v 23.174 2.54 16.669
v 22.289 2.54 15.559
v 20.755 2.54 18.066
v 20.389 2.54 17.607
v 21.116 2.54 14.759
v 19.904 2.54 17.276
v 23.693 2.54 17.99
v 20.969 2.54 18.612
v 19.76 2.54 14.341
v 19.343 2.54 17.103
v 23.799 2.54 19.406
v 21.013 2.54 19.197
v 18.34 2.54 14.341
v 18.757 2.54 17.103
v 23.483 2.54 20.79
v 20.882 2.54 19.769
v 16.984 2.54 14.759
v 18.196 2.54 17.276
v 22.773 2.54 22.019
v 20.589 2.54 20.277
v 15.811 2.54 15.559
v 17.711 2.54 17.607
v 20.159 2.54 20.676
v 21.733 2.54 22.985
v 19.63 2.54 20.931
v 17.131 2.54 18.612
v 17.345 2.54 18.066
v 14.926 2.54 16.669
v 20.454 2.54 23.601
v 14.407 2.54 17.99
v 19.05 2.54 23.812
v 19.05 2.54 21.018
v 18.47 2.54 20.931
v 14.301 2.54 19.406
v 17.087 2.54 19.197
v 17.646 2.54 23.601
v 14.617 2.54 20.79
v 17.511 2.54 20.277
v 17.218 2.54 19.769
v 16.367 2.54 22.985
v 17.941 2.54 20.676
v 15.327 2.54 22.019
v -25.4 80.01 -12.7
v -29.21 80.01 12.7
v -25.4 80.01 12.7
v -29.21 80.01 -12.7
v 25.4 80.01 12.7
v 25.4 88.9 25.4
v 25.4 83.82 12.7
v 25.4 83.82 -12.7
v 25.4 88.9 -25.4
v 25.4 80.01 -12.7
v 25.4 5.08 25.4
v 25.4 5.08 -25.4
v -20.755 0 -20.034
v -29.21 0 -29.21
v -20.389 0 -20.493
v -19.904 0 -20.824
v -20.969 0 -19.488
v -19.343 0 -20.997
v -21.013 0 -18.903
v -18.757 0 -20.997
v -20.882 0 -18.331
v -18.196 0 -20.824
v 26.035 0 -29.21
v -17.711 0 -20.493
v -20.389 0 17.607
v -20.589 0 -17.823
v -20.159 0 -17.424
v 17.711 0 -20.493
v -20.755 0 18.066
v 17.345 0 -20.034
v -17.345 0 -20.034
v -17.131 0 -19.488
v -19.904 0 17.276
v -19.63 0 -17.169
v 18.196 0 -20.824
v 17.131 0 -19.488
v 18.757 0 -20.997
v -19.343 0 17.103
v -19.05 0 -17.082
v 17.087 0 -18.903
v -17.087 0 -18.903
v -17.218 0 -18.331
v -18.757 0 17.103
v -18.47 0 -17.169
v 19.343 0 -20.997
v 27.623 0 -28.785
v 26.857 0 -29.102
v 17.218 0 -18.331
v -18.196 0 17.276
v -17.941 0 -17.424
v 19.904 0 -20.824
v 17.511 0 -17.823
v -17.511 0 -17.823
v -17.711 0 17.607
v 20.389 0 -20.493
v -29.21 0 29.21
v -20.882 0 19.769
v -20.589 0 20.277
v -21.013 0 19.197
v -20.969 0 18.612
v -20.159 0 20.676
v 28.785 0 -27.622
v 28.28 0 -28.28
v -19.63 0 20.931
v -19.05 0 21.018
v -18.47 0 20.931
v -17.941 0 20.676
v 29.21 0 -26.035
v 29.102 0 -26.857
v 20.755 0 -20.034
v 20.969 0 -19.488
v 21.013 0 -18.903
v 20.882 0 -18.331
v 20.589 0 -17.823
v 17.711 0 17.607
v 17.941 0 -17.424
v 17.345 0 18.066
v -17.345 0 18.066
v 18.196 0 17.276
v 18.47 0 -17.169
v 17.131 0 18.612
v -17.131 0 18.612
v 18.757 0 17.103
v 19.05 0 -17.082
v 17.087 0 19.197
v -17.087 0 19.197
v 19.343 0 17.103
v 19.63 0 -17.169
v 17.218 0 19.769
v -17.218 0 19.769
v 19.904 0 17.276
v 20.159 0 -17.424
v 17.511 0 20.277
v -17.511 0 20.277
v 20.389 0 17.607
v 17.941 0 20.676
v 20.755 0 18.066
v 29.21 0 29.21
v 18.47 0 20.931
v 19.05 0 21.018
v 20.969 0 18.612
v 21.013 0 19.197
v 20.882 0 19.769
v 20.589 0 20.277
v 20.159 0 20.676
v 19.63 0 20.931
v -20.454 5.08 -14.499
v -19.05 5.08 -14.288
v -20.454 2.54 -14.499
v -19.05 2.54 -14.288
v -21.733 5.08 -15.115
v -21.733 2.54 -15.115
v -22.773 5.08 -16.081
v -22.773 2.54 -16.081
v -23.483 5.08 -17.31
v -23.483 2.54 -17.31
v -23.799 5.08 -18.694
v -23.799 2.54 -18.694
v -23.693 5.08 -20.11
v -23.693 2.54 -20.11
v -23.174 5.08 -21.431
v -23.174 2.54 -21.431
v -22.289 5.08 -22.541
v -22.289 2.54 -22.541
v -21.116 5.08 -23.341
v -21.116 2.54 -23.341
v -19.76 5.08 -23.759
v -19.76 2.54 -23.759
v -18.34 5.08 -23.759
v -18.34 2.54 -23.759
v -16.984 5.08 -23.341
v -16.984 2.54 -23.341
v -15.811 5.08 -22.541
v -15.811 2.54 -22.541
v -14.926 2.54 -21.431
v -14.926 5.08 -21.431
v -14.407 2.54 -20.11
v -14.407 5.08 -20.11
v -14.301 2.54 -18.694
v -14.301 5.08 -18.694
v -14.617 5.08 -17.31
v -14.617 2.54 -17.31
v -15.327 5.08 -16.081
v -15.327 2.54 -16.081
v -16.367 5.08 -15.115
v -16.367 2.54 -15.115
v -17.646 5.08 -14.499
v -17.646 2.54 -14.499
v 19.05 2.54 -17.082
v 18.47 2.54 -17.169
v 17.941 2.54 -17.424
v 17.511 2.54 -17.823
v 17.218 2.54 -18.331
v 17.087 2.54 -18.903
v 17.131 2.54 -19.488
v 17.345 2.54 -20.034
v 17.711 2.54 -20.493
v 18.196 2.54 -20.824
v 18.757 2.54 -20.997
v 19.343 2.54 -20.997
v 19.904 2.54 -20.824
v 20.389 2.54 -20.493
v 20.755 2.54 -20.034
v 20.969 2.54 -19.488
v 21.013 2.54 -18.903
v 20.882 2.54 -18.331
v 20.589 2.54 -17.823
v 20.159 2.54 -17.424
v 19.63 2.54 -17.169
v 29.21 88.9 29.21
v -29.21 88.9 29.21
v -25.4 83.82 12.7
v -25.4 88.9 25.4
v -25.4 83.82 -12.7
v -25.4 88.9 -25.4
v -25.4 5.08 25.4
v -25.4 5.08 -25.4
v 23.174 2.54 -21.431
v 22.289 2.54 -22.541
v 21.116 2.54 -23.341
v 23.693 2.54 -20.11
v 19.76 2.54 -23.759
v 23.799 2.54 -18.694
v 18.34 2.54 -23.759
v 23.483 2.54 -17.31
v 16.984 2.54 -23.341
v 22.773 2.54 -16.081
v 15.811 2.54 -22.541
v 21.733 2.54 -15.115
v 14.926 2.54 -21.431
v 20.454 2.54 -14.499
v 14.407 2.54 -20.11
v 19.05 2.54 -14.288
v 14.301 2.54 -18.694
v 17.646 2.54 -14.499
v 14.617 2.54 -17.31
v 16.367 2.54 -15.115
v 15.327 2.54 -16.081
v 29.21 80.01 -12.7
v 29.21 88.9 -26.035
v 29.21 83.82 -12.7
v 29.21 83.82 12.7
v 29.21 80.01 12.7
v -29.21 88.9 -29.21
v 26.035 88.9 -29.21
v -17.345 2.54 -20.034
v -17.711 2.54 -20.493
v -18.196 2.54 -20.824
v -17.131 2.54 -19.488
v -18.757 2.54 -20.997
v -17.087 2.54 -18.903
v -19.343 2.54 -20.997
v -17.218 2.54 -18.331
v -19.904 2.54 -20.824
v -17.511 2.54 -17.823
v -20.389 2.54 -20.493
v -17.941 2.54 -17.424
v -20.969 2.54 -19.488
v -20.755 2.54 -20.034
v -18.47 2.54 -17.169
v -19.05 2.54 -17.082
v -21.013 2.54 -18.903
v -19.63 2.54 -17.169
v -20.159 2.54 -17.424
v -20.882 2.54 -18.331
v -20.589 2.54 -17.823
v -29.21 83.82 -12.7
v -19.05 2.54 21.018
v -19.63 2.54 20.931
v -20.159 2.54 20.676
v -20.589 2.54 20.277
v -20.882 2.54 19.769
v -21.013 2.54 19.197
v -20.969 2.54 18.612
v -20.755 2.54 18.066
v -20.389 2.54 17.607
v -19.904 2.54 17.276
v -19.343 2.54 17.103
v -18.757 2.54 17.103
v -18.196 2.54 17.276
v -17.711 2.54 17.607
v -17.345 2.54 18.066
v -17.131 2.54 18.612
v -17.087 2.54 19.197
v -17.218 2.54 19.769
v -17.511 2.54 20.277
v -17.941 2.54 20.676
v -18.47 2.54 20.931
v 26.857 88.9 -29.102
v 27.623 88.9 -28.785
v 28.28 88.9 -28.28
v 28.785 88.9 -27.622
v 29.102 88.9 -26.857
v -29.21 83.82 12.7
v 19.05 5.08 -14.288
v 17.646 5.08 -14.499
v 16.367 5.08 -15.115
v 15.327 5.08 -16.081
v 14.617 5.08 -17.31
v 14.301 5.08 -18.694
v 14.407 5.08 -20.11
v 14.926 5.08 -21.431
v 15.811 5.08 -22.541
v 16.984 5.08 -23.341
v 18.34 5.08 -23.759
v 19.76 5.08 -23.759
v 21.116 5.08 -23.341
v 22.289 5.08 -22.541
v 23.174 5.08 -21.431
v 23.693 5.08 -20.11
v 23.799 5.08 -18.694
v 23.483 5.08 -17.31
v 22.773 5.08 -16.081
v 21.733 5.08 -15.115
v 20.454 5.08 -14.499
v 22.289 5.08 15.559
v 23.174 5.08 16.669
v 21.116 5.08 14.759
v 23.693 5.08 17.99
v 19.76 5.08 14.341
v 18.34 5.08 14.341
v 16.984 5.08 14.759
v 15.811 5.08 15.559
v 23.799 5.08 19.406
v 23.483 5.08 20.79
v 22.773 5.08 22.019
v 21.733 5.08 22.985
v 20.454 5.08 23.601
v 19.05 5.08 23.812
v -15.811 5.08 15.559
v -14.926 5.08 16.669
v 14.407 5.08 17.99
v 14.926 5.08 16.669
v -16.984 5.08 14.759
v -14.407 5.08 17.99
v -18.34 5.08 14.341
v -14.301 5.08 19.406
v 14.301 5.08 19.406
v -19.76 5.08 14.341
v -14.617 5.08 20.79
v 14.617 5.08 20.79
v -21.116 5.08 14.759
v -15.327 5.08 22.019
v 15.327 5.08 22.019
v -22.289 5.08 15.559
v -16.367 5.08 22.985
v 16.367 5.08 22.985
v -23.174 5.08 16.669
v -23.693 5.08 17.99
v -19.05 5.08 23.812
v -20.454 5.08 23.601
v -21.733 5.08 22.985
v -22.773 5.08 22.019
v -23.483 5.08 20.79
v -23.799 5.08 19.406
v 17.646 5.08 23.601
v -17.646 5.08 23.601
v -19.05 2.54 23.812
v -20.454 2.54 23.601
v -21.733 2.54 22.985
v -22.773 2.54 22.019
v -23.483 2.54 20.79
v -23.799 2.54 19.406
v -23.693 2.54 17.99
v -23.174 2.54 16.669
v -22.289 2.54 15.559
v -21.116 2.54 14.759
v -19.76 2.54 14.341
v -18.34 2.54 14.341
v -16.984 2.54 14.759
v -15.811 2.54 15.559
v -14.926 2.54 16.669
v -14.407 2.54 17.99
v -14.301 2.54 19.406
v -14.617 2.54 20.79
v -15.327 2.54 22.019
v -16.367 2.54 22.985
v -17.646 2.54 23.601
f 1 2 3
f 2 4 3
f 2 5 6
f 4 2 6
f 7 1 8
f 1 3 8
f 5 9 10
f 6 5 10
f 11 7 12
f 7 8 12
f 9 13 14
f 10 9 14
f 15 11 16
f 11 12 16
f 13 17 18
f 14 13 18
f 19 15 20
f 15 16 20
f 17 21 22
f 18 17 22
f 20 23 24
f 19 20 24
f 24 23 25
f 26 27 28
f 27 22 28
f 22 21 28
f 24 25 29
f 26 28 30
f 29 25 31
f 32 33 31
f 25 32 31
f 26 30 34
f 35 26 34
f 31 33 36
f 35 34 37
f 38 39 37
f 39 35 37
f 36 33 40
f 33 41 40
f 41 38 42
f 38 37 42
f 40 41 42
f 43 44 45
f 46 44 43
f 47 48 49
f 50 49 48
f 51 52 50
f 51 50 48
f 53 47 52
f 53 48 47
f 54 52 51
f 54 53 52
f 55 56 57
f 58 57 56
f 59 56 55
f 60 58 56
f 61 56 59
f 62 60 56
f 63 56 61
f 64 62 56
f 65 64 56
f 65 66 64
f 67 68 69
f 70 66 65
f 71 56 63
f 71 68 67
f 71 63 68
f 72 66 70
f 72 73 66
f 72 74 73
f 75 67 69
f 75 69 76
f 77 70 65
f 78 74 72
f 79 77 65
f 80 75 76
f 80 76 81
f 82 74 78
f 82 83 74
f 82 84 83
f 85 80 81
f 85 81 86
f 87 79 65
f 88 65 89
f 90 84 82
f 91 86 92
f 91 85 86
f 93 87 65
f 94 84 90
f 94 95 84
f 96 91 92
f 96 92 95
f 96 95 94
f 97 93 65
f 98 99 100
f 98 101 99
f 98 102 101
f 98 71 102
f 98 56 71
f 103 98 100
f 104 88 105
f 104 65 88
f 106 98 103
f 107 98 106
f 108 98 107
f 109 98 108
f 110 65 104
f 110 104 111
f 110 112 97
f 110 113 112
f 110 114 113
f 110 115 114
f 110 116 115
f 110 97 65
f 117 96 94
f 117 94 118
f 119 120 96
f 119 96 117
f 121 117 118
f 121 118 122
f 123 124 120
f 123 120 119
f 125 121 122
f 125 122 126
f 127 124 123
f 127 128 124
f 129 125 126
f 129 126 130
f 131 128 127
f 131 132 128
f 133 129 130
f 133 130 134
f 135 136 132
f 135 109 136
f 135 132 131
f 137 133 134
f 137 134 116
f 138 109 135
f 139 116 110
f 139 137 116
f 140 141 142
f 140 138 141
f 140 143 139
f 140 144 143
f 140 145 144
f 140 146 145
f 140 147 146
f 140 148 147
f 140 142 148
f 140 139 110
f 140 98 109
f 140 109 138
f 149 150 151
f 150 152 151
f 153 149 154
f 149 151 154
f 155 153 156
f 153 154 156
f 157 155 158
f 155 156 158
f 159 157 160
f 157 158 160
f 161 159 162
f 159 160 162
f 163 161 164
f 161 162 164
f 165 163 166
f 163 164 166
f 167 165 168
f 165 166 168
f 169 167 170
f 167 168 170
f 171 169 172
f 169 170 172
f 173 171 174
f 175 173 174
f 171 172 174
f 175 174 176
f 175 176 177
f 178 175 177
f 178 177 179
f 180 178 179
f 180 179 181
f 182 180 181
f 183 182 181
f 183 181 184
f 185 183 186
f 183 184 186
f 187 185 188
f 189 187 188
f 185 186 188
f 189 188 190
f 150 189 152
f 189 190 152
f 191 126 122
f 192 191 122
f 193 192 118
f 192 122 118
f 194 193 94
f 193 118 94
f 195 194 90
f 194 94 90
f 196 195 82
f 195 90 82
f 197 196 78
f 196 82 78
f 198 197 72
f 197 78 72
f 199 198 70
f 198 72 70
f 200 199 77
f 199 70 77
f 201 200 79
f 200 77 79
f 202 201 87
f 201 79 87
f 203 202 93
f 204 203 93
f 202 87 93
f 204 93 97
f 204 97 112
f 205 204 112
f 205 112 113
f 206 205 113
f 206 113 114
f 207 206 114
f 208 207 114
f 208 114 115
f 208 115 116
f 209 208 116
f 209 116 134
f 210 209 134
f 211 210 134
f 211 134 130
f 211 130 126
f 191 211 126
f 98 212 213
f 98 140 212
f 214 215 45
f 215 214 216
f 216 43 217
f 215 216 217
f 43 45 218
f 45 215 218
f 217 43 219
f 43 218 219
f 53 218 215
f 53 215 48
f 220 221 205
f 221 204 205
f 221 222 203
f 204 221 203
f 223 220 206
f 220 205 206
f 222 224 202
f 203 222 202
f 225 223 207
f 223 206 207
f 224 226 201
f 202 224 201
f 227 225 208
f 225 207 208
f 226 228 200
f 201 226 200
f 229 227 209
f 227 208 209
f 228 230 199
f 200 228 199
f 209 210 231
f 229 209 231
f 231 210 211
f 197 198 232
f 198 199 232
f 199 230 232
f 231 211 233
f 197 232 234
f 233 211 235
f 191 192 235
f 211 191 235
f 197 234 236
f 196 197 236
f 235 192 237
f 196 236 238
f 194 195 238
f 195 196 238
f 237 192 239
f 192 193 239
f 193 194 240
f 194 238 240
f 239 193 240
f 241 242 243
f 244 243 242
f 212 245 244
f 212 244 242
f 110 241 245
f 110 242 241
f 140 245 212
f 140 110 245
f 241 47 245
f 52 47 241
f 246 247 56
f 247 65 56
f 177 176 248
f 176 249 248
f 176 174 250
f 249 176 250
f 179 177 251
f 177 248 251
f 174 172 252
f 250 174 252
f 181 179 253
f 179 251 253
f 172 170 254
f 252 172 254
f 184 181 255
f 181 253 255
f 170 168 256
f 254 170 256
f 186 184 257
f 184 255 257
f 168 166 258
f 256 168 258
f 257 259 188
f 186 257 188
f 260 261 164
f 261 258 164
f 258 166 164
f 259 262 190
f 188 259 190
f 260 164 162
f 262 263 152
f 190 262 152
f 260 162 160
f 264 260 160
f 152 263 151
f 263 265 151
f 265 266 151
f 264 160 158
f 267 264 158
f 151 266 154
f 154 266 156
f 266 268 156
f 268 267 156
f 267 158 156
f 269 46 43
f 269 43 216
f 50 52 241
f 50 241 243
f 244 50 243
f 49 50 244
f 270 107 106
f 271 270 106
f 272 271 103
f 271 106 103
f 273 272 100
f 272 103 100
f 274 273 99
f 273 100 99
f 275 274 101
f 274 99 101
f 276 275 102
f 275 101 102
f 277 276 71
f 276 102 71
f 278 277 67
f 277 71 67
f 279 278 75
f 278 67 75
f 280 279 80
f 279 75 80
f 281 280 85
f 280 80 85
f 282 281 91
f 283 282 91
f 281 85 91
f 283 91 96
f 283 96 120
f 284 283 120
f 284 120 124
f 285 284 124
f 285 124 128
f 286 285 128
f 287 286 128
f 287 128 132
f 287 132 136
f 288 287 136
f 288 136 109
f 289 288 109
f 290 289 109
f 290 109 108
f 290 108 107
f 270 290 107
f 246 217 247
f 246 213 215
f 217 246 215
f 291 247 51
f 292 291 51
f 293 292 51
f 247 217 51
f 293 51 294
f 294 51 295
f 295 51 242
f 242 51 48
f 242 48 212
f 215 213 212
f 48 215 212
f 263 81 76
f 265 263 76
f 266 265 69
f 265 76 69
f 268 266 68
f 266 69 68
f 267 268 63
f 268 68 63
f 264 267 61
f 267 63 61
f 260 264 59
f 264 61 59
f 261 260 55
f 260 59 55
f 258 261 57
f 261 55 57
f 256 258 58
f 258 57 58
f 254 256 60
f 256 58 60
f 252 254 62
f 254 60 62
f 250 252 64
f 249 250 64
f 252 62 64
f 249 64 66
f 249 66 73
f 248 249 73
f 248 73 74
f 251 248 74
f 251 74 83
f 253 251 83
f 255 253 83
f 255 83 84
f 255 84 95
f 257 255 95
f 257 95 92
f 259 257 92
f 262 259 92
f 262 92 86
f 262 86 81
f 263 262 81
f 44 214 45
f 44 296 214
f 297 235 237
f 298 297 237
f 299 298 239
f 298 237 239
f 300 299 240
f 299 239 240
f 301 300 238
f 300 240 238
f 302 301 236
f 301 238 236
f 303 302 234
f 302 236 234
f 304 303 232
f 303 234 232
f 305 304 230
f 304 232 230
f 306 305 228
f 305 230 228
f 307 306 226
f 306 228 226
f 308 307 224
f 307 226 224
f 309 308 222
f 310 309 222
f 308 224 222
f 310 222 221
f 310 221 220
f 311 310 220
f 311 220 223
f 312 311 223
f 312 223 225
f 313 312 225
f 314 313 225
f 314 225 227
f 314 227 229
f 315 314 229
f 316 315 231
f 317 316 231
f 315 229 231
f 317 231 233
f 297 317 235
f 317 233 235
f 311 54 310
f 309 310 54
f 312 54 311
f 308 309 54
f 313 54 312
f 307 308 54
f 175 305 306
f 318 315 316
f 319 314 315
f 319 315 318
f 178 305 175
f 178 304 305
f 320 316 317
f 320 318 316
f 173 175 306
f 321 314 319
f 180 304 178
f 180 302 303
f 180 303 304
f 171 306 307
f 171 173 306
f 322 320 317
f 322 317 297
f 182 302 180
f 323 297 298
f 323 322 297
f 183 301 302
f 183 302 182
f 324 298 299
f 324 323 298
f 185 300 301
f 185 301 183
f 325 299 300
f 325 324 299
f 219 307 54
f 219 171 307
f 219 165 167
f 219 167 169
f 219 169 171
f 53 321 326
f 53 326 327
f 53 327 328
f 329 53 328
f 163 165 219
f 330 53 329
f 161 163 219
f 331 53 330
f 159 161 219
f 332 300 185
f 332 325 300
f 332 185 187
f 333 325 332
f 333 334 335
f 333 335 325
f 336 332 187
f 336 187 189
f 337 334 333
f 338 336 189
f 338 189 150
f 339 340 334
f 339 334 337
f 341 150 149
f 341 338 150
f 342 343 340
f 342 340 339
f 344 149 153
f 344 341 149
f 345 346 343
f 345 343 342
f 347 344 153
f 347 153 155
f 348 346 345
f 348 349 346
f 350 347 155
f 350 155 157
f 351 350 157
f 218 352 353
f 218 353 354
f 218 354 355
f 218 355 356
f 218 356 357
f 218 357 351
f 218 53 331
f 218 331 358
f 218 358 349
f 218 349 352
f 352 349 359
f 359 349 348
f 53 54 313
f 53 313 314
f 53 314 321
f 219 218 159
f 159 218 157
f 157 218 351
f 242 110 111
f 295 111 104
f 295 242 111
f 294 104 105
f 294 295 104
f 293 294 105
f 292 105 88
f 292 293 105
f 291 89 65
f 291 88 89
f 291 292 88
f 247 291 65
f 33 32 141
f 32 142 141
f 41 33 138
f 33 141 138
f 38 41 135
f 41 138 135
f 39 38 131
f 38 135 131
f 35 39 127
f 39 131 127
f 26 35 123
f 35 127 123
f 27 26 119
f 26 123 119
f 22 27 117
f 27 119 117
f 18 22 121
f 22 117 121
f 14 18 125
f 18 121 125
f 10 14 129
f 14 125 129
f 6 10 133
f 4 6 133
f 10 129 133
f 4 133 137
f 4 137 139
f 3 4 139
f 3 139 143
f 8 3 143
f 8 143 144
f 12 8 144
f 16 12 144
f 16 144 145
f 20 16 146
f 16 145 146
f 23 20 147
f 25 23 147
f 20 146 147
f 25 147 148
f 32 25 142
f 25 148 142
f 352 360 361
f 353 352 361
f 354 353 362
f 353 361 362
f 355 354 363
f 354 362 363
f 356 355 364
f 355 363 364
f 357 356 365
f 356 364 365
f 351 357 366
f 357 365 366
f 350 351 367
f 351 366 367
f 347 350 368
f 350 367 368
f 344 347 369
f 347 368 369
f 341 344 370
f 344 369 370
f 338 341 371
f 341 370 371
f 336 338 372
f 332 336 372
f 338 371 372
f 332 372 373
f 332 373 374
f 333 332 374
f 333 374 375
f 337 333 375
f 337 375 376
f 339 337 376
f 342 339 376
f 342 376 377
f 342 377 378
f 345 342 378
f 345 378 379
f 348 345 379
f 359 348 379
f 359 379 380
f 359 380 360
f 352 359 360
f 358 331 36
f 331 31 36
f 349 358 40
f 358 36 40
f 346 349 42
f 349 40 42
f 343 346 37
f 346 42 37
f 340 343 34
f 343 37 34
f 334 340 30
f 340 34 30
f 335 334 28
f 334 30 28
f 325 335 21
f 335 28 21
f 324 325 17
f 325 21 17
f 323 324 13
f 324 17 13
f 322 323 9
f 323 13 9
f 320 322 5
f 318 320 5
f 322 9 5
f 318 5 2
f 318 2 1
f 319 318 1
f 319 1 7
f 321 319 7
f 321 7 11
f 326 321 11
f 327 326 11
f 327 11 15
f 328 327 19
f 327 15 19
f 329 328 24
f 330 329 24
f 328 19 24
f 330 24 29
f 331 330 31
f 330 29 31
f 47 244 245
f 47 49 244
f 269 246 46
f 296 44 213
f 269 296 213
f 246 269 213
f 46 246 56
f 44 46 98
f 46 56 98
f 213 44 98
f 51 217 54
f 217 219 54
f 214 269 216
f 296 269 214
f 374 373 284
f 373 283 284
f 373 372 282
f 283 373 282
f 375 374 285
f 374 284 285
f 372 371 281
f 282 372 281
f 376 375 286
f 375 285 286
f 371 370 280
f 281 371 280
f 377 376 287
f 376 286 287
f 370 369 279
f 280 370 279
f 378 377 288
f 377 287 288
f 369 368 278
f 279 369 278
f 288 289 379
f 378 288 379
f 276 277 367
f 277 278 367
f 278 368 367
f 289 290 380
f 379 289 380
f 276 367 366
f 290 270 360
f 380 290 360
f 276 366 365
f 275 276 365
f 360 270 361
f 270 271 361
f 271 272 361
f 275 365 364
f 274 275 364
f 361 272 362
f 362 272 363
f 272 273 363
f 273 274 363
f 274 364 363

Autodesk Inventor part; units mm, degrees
ref_plane "YZ Plane" through (0, 0, 0) normal (1, 0, 0) x (0, 1, 0)
ref_plane "XZ Plane" through (0, 0, 0) normal (0, 1, 0) x (-1, 0, 0)
ref_plane "XY Plane" through (0, 0, 0) normal (0, 0, 1) x (1, 0, 0)
sketch "Sketch1" plane through (0, 0, 0) normal (0, 1, 0) x (-1, 0, 0)
  line L0 (25.4, 25.4) -> (-25.4, 25.4)
  line L1 (-25.4, 25.4) -> (-25.4, -25.4)
  line L2 (-25.4, -25.4) -> (25.4, -25.4)
  line L3 (25.4, -25.4) -> (25.4, 25.4)
  line L4 (25.4, 25.4) -> (-25.4, -25.4) construction
  line L5 (-25.4, 25.4) -> (25.4, -25.4) construction
  point P0 (0, 0)
  dimension "d0" = 50.8
  dimension "d1" = 50.8
extrude "Extrusion1" add sketch "Sketch1" along normal blind 5.08
sketch "Sketch2" plane through (0, 5.08, 0) normal (0, 1, 0) x (1, 0, 0)
  line L0 (-25.4, -25.4) -> (25.4, -25.4) projected
  line L1 (-25.4, 25.4) -> (-25.4, -25.4) projected
  line L2 (25.4, -25.4) -> (25.4, 25.4) projected
  line L3 (25.4, 25.4) -> (-25.4, 25.4) projected
  point P0 (0, 0)
  point P1 (-19.05, -19.05)
  point P2 (-19.05, 19.05)
  point P3 (19.05, 19.05)
  point P4 (19.05, -19.05)
  dimension "d4" = 6.35
  dimension "d5" = 6.35
  dimension "d6" = 6.35
  dimension "d7" = 6.35
  dimension "d8" = 6.35
  dimension "d9" = 6.35
  dimension "d10" = 6.35
  dimension "d11" = 6.35
hole "Hole1" at (-19.05, 5.08, 19.05) at (19.05, 5.08, 19.05) at (19.05, 5.08, -19.05) at (-19.05, 5.08, -19.05) direction (0, -1, 0) diameter 3.937 end through all counterbore diameter 9.525 counterbore depth 2.54
sketch "Sketch3" plane through (0, 0, 0) normal (0, -1, 0) x (1, 0, 0)
  line L0 (-29.21, -25.4) -> (-29.21, 25.4)
  line L1 (-25.4, 25.4) -> (-25.4, -25.4)
  line L2 (-25.4, -25.4) -> (25.4, -25.4)
  line L3 (29.21, -25.4) -> (29.21, -29.21)
  line L4 (29.21, -29.21) -> (-29.21, -29.21)
  line L5 (-29.21, -29.21) -> (-29.21, -25.4)
  line L6 (25.4, -25.4) -> (-25.4, -25.4) projected
  line L7 (29.21, -25.4) -> (29.21, 25.4)
  line L8 (25.4, 25.4) -> (25.4, -25.4)
  line L9 (-25.4, 25.4) -> (25.4, 25.4)
  line L10 (29.21, 25.4) -> (29.21, 29.21)
  line L11 (29.21, 29.21) -> (-29.21, 29.21)
  line L12 (-29.21, 29.21) -> (-29.21, 25.4)
  point P0 (0, 0)
  dimension "d20" = 58.42
  dimension "d21" = 3.81
  dimension "d23" = 58.42
  dimension "d24" = 3.81
extrude "Extrusion2" add sketch "Sketch3" against normal blind 88.9
fillet "Fillet1" radius 3.175 1 edges at (29.21, 44.45, -29.21)
sketch "Sketch4" plane through (-29.21, 0, -26.035) normal (-1, 0, 0) x (0, 0, 1)
  line L0 (13.335, 83.82) -> (38.735, 83.82)
  line L1 (38.735, 83.82) -> (38.735, 80.01)
  line L2 (38.735, 80.01) -> (13.335, 80.01)
  line L3 (13.335, 80.01) -> (13.335, 83.82)
  line L4 (0, 88.9) -> (52.07, 88.9) projected
  line L5 (55.245, 0) -> (55.245, 88.9) projected
  line L6 (-3.175, 88.9) -> (-3.175, 0) projected
  point P0 (26.035, 0)
  dimension "d28" = 25.4
  dimension "d29" = 5.08
  dimension "d30" = 3.81
  dimension "d31" = 16.51
  dimension "d32" = 16.51
extrude "Extrusion3" cut sketch "Sketch4" against normal through all
equation "\"d6\" = d5"
equation "\"d7\" = d4"
equation "\"d8\" = d6"
equation "\"d9\" = d4"
equation "\"d10\" = d4"
equation "\"d11\" = d5"
properties part number "vertical batter holder 4 holes in bottom"
